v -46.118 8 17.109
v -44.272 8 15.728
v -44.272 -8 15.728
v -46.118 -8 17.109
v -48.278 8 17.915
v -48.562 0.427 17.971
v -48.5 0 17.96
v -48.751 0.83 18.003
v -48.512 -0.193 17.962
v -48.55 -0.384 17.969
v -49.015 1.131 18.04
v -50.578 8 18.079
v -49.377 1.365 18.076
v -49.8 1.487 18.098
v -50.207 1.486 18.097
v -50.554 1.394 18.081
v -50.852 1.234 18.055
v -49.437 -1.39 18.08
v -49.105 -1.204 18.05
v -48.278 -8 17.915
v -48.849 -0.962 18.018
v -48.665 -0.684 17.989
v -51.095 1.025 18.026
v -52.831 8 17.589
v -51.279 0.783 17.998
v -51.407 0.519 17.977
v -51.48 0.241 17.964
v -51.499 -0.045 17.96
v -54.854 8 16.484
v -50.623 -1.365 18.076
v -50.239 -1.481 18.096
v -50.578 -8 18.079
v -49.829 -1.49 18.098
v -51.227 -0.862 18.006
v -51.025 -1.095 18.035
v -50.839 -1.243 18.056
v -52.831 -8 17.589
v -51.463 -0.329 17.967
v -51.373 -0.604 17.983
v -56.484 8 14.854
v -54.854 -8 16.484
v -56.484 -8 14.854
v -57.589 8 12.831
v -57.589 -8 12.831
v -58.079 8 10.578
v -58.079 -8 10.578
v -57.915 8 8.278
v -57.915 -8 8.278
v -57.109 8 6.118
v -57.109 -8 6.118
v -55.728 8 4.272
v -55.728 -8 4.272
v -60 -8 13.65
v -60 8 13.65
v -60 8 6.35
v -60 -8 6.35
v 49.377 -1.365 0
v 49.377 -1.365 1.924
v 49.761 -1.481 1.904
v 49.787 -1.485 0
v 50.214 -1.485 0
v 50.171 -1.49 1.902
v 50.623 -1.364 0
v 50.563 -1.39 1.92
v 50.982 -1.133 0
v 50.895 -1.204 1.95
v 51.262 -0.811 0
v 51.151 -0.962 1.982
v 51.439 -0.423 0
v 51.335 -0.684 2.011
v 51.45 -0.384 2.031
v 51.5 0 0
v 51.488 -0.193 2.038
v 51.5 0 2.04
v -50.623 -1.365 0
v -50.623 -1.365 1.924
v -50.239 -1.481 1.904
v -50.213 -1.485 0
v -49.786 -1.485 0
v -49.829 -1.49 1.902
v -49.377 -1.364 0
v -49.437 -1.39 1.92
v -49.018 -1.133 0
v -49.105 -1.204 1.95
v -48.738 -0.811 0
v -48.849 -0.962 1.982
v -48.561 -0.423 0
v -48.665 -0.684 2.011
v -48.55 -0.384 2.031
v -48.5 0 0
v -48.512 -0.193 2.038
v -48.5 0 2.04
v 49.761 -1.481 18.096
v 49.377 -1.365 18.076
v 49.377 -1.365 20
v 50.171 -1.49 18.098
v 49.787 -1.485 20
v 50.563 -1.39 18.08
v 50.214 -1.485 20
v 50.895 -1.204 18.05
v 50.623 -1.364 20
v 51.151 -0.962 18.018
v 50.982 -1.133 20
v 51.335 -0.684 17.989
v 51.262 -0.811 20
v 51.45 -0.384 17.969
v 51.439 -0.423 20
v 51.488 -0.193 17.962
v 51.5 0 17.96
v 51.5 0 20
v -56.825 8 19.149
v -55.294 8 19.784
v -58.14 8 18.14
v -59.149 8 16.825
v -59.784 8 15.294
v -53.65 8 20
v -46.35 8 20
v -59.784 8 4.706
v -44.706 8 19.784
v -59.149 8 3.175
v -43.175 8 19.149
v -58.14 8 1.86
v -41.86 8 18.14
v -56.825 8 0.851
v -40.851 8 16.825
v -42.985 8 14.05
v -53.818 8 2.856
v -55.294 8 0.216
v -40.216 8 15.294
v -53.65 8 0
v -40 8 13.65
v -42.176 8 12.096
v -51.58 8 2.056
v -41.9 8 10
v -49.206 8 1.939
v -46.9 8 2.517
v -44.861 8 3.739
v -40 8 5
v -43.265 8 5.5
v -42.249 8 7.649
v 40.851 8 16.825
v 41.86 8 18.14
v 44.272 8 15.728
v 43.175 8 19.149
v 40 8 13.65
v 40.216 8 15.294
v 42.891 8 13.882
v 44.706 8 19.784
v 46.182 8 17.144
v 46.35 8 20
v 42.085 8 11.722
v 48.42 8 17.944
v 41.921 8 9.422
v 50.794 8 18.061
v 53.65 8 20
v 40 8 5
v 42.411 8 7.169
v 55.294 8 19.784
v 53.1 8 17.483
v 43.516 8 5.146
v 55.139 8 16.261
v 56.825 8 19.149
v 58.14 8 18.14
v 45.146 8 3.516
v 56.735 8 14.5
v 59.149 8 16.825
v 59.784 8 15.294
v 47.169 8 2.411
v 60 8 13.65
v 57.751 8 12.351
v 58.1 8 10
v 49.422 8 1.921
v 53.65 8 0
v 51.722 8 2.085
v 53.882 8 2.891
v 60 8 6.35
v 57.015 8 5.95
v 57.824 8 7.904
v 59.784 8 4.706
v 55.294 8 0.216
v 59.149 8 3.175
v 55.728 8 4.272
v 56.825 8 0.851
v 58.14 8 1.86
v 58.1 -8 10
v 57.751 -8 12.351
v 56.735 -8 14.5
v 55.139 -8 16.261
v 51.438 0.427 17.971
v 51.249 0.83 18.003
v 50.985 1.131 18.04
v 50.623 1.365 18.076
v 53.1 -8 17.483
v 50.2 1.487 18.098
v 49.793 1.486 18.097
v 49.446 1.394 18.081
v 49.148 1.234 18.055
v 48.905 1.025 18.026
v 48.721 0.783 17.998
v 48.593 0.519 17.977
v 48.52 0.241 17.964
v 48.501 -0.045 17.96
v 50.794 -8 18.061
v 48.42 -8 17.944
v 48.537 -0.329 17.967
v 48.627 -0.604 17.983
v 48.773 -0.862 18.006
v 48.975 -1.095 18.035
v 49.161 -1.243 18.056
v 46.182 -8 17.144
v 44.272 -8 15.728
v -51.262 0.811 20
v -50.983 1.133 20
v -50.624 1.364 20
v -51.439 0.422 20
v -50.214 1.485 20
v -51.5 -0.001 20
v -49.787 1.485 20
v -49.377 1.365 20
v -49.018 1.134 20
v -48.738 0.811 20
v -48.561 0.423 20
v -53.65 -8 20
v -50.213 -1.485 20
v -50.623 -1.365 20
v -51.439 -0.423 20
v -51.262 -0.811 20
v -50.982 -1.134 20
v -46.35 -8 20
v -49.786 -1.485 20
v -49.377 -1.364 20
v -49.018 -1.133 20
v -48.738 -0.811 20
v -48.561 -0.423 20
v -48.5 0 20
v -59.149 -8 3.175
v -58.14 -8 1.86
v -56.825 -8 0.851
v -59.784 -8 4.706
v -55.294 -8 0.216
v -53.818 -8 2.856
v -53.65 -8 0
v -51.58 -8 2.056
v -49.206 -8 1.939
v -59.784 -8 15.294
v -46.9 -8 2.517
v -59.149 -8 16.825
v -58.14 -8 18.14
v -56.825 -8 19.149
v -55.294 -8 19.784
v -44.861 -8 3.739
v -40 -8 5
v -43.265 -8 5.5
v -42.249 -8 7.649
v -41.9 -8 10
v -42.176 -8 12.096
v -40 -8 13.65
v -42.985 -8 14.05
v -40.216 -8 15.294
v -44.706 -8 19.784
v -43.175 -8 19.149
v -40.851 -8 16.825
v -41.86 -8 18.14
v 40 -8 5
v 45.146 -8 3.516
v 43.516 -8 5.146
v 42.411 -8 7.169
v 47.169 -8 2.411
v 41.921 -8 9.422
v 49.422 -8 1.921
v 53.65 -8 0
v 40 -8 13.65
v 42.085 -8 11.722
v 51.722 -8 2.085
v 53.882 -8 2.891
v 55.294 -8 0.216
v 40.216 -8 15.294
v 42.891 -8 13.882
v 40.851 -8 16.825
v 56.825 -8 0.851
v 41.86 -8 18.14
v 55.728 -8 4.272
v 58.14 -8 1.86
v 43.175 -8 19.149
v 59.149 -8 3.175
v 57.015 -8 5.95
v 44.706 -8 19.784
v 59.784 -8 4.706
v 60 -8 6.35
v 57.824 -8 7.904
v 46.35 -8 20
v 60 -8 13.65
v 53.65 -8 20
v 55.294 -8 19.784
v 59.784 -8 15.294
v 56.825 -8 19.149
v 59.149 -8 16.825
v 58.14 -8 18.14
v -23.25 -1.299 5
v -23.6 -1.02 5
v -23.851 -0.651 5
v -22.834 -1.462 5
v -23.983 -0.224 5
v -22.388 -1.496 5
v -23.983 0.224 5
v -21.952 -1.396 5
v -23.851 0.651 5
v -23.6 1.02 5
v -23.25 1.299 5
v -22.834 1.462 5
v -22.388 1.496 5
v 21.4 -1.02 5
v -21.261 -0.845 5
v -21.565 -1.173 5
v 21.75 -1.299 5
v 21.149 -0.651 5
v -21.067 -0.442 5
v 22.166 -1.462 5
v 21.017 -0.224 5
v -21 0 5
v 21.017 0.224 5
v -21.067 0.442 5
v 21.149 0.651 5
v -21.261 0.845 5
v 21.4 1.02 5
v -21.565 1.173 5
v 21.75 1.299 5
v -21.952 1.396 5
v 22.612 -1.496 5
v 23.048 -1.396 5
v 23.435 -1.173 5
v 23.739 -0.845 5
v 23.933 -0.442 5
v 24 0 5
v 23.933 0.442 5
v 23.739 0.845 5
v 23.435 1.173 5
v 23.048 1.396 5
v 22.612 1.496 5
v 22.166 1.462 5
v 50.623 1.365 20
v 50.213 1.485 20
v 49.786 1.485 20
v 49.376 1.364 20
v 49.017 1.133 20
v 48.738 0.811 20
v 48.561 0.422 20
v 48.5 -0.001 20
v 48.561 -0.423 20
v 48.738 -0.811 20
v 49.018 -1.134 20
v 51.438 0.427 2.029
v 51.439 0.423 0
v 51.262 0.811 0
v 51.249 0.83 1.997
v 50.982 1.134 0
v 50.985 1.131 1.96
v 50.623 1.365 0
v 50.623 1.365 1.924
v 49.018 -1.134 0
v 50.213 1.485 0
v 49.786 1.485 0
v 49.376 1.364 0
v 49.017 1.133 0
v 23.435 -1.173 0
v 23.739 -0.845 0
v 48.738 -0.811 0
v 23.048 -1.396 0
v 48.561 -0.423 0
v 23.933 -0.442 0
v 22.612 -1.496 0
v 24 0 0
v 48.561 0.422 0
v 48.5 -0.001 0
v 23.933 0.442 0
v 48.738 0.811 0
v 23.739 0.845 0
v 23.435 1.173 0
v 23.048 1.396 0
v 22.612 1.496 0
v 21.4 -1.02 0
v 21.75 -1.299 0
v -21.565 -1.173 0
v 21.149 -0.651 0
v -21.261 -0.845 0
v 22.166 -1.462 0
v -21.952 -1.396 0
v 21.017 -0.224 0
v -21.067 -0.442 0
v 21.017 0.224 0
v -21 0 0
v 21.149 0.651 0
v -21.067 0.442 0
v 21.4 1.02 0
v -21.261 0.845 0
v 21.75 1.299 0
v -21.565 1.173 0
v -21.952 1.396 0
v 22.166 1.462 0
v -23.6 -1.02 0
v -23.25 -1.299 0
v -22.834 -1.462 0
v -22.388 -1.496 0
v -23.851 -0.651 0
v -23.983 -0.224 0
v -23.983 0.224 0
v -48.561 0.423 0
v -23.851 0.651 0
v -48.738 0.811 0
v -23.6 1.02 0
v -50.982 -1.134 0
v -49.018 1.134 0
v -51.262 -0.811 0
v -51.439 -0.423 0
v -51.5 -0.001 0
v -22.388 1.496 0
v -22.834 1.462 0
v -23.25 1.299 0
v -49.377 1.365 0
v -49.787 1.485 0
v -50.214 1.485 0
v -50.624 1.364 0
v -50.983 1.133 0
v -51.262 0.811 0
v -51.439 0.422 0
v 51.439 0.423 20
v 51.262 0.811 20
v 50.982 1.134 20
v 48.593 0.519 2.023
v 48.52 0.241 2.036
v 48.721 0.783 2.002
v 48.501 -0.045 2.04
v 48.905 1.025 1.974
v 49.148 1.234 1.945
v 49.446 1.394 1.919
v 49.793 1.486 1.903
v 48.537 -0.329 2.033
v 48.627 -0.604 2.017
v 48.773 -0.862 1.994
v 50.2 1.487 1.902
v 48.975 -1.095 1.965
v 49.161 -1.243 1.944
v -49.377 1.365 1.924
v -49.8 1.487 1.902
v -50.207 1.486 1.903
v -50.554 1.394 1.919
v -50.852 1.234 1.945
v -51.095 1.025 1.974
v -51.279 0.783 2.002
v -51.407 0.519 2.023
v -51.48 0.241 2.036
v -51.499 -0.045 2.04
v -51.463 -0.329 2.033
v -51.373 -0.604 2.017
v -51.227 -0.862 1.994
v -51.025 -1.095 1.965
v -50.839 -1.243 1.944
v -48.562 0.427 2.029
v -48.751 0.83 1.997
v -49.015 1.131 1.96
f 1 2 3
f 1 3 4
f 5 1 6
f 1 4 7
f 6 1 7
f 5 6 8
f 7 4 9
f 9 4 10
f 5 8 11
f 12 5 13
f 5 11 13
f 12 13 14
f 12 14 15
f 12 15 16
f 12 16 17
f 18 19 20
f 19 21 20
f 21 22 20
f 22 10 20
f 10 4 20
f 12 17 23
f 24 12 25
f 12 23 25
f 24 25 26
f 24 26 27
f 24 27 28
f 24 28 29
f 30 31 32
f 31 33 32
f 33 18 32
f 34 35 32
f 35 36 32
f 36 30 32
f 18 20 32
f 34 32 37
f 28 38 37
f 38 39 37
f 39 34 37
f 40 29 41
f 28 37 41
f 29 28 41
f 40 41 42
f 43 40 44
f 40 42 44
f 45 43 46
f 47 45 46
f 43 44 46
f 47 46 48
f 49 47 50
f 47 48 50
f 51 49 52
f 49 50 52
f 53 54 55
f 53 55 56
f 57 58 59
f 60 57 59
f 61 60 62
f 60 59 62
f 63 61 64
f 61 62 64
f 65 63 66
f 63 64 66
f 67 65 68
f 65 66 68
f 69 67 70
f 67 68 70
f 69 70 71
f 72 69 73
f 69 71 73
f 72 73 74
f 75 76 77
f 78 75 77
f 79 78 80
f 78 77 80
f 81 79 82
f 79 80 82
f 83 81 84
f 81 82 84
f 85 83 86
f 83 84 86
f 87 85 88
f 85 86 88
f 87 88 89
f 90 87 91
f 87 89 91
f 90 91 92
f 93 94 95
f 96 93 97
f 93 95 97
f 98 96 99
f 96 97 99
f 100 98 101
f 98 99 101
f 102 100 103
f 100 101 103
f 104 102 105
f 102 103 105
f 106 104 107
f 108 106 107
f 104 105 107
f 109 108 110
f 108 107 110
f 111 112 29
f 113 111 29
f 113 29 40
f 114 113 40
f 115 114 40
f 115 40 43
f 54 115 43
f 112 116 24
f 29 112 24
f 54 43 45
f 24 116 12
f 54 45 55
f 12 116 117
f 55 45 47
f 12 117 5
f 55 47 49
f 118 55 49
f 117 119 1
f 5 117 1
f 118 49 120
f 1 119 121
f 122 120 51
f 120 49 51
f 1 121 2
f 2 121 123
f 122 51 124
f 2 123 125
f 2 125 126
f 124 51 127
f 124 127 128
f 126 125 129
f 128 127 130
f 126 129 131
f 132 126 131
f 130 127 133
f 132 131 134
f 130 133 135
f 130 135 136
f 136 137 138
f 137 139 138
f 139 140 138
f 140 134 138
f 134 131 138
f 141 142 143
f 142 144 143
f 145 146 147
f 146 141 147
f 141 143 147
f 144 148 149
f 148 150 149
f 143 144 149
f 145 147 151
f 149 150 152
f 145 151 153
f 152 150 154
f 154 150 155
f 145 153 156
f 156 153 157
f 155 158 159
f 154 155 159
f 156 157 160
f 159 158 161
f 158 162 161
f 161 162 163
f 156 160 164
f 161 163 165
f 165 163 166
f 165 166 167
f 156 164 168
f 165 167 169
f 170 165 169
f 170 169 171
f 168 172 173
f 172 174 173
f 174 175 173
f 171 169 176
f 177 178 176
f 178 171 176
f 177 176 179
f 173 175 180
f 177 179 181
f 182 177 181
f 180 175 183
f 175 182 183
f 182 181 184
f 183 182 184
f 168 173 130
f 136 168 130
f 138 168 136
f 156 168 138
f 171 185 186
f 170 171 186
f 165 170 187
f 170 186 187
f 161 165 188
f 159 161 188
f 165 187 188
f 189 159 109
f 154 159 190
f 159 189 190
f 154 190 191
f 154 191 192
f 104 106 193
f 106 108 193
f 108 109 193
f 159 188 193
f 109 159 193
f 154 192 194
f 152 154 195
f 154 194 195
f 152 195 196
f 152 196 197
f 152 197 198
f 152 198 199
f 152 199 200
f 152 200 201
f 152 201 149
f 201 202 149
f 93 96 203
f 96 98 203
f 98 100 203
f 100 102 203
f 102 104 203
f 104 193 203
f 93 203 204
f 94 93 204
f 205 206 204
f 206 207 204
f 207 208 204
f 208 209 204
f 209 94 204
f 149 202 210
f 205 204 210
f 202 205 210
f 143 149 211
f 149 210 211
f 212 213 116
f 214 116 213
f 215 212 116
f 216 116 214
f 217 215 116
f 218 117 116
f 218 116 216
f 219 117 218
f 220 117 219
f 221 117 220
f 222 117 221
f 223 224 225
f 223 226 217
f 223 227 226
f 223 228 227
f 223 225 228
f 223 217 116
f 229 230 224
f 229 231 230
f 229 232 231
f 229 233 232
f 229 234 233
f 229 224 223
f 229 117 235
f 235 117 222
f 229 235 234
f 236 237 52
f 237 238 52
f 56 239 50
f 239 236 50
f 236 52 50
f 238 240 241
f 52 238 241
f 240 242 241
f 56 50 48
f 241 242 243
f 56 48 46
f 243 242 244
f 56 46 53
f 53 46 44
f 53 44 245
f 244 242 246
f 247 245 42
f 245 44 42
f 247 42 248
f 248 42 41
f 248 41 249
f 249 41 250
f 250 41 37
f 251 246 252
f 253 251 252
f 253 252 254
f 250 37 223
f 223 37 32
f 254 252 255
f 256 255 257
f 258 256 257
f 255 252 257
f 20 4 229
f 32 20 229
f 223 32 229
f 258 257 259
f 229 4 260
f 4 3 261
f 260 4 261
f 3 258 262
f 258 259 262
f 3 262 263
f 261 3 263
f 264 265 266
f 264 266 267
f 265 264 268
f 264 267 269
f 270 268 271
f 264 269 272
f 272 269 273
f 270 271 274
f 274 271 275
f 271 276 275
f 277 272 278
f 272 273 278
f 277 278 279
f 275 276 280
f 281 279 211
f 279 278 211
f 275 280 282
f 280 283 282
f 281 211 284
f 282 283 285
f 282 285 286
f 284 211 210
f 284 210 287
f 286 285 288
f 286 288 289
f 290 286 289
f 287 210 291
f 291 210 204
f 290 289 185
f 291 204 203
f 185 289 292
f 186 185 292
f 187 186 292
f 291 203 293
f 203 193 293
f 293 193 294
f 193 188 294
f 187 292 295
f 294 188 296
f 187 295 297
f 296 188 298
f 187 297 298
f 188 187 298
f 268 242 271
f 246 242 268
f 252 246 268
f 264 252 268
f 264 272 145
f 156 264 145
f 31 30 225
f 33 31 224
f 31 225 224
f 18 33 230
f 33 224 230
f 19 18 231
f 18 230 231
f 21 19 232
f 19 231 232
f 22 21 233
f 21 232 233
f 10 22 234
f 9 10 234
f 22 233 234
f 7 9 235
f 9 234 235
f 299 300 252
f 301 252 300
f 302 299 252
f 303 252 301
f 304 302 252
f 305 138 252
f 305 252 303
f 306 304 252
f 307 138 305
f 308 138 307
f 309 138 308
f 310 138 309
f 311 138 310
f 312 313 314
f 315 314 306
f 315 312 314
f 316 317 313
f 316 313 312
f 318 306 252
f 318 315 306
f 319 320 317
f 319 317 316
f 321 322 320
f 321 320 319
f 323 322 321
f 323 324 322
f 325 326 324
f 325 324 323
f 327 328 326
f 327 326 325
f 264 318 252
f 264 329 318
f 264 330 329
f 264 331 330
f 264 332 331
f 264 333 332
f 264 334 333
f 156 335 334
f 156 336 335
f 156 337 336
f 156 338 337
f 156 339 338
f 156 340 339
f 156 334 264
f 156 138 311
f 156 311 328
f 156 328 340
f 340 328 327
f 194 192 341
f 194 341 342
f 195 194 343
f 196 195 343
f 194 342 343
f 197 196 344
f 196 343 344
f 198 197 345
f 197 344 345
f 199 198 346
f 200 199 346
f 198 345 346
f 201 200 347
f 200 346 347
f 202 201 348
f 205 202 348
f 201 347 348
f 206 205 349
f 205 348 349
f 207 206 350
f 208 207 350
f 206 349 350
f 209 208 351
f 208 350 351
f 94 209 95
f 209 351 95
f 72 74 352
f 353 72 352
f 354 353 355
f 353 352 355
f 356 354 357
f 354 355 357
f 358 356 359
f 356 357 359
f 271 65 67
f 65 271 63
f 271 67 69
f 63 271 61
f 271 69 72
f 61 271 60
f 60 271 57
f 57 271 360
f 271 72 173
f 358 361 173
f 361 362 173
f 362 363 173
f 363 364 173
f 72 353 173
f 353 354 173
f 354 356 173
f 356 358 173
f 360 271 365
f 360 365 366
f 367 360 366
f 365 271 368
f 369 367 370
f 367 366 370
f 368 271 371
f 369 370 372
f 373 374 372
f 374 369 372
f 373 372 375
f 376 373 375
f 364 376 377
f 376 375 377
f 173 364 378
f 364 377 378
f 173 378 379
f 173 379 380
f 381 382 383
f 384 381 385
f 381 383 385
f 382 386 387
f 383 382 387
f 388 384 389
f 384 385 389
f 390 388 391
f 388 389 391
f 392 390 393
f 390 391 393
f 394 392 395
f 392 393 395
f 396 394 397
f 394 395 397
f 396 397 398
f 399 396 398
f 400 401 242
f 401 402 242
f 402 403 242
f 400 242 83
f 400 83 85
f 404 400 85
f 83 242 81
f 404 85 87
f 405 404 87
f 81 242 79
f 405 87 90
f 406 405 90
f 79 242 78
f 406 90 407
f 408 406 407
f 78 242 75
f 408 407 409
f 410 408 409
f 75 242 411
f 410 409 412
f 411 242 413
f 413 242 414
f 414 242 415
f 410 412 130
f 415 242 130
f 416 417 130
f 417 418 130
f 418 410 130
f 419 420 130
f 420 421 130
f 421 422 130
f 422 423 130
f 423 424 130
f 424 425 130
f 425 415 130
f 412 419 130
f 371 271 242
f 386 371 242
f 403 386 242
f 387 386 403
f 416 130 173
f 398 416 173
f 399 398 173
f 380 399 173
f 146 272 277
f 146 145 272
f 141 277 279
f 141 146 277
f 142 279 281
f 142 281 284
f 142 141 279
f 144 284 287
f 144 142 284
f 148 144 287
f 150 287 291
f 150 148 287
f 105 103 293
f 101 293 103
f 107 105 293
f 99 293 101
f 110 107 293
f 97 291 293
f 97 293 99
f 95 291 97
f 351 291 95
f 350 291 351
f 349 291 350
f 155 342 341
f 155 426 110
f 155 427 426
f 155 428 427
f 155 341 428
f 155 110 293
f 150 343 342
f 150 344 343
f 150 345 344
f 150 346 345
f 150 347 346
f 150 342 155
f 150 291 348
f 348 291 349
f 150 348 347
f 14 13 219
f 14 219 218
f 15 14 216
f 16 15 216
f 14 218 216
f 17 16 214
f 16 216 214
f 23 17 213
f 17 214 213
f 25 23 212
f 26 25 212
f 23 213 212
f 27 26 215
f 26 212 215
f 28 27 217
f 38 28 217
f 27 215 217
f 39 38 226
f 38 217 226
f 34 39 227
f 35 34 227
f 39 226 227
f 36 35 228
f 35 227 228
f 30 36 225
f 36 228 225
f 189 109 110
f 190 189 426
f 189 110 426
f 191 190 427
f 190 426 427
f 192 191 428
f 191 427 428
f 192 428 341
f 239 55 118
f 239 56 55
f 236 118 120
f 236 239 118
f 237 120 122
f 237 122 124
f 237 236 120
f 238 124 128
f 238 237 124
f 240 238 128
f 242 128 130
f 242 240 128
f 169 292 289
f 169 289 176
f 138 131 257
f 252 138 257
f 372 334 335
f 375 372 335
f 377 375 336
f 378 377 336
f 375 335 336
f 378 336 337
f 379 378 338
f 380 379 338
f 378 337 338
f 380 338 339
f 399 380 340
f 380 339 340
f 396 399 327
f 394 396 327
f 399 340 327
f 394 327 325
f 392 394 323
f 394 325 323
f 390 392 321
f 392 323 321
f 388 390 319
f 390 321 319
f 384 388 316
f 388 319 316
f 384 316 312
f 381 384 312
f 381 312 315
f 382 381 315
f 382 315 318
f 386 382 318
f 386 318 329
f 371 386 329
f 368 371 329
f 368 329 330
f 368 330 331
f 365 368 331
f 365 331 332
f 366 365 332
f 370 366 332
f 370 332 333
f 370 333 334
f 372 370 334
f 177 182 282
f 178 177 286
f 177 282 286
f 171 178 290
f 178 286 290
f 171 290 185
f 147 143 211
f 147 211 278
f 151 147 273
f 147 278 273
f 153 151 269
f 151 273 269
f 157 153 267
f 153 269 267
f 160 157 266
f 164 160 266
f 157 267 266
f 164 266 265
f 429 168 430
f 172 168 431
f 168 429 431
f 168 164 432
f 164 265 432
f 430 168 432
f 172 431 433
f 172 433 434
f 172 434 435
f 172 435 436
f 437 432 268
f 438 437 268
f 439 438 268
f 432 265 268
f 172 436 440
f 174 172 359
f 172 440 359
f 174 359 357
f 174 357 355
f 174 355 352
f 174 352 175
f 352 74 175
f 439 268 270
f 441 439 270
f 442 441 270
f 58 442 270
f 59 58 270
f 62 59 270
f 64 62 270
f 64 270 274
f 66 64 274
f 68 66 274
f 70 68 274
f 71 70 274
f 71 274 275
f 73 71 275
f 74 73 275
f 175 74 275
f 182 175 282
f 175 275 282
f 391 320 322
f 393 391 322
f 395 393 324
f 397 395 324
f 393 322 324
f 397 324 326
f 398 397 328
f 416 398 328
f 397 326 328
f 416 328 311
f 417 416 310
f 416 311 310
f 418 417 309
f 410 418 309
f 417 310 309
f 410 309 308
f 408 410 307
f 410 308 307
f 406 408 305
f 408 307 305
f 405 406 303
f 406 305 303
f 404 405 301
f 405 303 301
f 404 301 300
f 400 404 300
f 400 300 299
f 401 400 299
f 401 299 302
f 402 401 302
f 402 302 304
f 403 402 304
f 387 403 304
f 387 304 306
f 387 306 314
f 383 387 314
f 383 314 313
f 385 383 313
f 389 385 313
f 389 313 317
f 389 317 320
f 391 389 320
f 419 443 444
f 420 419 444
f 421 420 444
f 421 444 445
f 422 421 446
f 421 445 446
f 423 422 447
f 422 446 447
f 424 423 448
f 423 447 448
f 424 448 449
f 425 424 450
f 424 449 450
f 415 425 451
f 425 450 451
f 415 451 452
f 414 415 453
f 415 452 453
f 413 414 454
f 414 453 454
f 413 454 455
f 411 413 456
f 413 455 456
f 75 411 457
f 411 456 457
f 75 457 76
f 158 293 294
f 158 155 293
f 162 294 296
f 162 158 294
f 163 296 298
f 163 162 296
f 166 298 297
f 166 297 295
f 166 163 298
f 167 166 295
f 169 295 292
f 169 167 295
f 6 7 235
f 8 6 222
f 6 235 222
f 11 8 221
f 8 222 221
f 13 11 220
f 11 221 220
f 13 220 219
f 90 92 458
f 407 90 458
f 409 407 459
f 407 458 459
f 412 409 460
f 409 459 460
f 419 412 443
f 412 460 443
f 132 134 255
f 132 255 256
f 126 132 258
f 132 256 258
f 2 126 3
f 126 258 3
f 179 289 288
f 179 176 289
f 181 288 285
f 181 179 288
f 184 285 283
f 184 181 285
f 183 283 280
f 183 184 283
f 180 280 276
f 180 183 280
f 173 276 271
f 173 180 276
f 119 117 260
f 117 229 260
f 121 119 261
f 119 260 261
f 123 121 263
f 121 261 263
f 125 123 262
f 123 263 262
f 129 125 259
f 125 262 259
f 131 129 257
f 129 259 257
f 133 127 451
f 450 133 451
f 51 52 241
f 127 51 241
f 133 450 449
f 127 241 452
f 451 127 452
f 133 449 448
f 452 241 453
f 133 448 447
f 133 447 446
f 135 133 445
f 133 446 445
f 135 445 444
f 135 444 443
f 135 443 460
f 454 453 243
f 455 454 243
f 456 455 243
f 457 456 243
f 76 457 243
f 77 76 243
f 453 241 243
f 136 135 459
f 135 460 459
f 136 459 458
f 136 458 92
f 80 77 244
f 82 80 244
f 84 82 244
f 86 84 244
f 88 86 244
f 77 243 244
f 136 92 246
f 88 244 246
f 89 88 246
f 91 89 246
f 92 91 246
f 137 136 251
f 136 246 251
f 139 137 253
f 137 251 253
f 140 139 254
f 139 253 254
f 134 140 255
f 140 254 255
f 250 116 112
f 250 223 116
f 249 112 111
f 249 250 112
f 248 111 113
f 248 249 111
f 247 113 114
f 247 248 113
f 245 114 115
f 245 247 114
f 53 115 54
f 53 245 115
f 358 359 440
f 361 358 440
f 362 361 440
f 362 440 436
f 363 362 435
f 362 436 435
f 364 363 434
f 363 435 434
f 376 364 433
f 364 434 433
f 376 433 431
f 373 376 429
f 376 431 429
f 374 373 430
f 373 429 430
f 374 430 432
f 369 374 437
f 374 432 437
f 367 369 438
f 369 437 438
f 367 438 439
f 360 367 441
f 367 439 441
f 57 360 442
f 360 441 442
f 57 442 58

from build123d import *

# Parameters (mm, degrees)
F1_DEPTH  = 5
F3_DEPTH  = 80
F4_W      = 16
F4_H      = 15
F4_H_2    = 5
F5_DEPTH  = 20
F7_W      = 16
F7_H      = 15
F7_H_2    = 5
F8_DEPTH  = 20
F10_DEPTH = 16
F11_R     = 6.35
F13_DEPTH = 80
F16_DEPTH = 20
F18_DEPTH = 10


with BuildPart() as f1:
    # F0 (on Top) → F1 (new body)
    with BuildSketch(Plane.XY):
        Polygon((40, 0), (40, 8), (-40, 8), (-40, 0), (-40, -8), (40, -8), align=None)
    extrude(amount=F1_DEPTH)

    # F2 (on face) → F3 (join)
    with BuildSketch(Plane.YZ.offset(40)):
        Polygon((8, 0), (-8, 0), (8, -16), align=None)
    extrude(amount=-F3_DEPTH)

    # F4 (on face) → F5 (join)
    with BuildSketch(Plane.YZ.offset(40)):
        with Locations((0, 12.5)):
            Rectangle(F4_W, F4_H)
        with Locations((0, 2.5)):
            Rectangle(F4_W, F4_H_2)
    extrude(amount=F5_DEPTH)

    # F7 (on face) → F8 (join)
    with BuildSketch(Plane(origin=(-40, 0, 0), x_dir=(0, -1, 0), z_dir=(-1, 0, 0))):
        with Locations((0, 12.5)):
            Rectangle(F7_W, F7_H)
        with Locations((0, 2.5)):
            Rectangle(F7_W, F7_H_2)
    extrude(amount=F8_DEPTH)

    # F9 (on face) + F6 (on face) → F10 (cut)
    with BuildSketch(Plane.XZ.offset(8)):
        with BuildLine():
            ThreePointArc((-44.2724350724, 15.7275649276), (-55.7275649276, 15.7275649276), (-55.7275649276, 4.2724350724))
            Line((-55.7275649276, 4.2724350724), (-50, 10))
            Line((-50, 10), (-44.2724350724, 15.7275649276))
        make_face()
        with BuildLine():
            Line((-50, 10), (-55.7275649276, 4.2724350724))
            ThreePointArc((-55.7275649276, 4.2724350724), (-46.9002641978, 2.5165757867), (-41.9, 10))
            ThreePointArc((-41.9, 10), (-42.5165757867, 13.0997358022), (-44.2724350724, 15.7275649276))
            Line((-44.2724350724, 15.7275649276), (-50, 10))
        make_face()
    with BuildSketch(Plane.XZ.offset(8)):
        with BuildLine():
            ThreePointArc((44.2724350724, 15.7275649276), (44.2724350724, 4.2724350724), (55.7275649276, 4.2724350724))
            Line((55.7275649276, 4.2724350724), (50, 10))
            Line((50, 10), (44.2724350724, 15.7275649276))
        make_face()
        with BuildLine():
            Line((50, 10), (55.7275649276, 4.2724350724))
            ThreePointArc((55.7275649276, 4.2724350724), (57.4834242133, 6.9002641978), (58.1, 10))
            ThreePointArc((58.1, 10), (53.0997358022, 17.4834242133), (44.2724350724, 15.7275649276))
            Line((44.2724350724, 15.7275649276), (50, 10))
        make_face()
    extrude(amount=-F10_DEPTH, mode=Mode.SUBTRACT)

    # F11
    f11_edges = [f1.edges().sort_by_distance(p)[0] for p in [
        (40, 0, 20),
        (60, 0, 20),
        (60, 0, 0),
        (-60, 0, 0),
        (-60, 0, 20),
        (-40, 0, 20),
    ]]
    fillet(f11_edges, radius=F11_R)

    # F12 (on face) → F13 (cut)
    with BuildSketch(Plane.YZ.offset(40)):
        Polygon((8, -16), (8, 0), (-8, 0), align=None)
    extrude(amount=-F13_DEPTH, mode=Mode.SUBTRACT)

    # F14 (on face) + F15 (on face) → F16 (cut)
    with BuildSketch(Plane.XY.offset(20)):
        with BuildLine():
            Line((-50, 0), (-50.6226316309, -1.3646720677))
            ThreePointArc((-50.6226316309, -1.3646720677), (-49.1888118117, -1.2617344107), (-48.5, 0))
            ThreePointArc((-48.5, 0), (-48.7382655893, 0.8111881883), (-49.3773683691, 1.3646720677))
            Line((-49.3773683691, 1.3646720677), (-50, 0))
        make_face()
        with BuildLine():
            ThreePointArc((-49.3773683691, 1.3646720677), (-51.3646720677, 0.6226316309), (-50.6226316309, -1.3646720677))
            Line((-50.6226316309, -1.3646720677), (-50, 0))
            Line((-50, 0), (-49.3773683691, 1.3646720677))
        make_face()
    with BuildSketch(Plane.XY.offset(20)):
        with BuildLine():
            Line((50, 0), (49.3773683691, -1.3646720677))
            ThreePointArc((49.3773683691, -1.3646720677), (50.8111881883, -1.2617344107), (51.5, 0))
            ThreePointArc((51.5, 0), (51.2617344107, 0.8111881883), (50.6226316309, 1.3646720677))
            Line((50.6226316309, 1.3646720677), (50, 0))
        make_face()
        with BuildLine():
            ThreePointArc((50.6226316309, 1.3646720677), (48.6353279323, 0.6226316309), (49.3773683691, -1.3646720677))
            Line((49.3773683691, -1.3646720677), (50, 0))
            Line((50, 0), (50.6226316309, 1.3646720677))
        make_face()
    extrude(amount=-F16_DEPTH, mode=Mode.SUBTRACT)

    # F17 (on face) → F18 (cut)
    with BuildSketch(Plane.XY.offset(5)):
        with BuildLine():
            Line((-22.5, 0), (-24, 0))
            ThreePointArc((-24, 0), (-22.5, -1.5), (-21, 0))
            Line((-21, 0), (-22.5, 0))
        make_face()
        with BuildLine():
            ThreePointArc((-21, 0), (-22.5, 1.5), (-24, 0))
            Line((-24, 0), (-22.5, 0))
            Line((-22.5, 0), (-21, 0))
        make_face()
        with BuildLine():
            Line((22.5, 0), (21, 0))
            ThreePointArc((21, 0), (22.5, -1.5), (24, 0))
            Line((24, 0), (22.5, 0))
        make_face()
        with BuildLine():
            ThreePointArc((24, 0), (22.5, 1.5), (21, 0))
            Line((21, 0), (22.5, 0))
            Line((22.5, 0), (24, 0))
        make_face()
    extrude(amount=-F18_DEPTH, mode=Mode.SUBTRACT)


solid = f1.part
